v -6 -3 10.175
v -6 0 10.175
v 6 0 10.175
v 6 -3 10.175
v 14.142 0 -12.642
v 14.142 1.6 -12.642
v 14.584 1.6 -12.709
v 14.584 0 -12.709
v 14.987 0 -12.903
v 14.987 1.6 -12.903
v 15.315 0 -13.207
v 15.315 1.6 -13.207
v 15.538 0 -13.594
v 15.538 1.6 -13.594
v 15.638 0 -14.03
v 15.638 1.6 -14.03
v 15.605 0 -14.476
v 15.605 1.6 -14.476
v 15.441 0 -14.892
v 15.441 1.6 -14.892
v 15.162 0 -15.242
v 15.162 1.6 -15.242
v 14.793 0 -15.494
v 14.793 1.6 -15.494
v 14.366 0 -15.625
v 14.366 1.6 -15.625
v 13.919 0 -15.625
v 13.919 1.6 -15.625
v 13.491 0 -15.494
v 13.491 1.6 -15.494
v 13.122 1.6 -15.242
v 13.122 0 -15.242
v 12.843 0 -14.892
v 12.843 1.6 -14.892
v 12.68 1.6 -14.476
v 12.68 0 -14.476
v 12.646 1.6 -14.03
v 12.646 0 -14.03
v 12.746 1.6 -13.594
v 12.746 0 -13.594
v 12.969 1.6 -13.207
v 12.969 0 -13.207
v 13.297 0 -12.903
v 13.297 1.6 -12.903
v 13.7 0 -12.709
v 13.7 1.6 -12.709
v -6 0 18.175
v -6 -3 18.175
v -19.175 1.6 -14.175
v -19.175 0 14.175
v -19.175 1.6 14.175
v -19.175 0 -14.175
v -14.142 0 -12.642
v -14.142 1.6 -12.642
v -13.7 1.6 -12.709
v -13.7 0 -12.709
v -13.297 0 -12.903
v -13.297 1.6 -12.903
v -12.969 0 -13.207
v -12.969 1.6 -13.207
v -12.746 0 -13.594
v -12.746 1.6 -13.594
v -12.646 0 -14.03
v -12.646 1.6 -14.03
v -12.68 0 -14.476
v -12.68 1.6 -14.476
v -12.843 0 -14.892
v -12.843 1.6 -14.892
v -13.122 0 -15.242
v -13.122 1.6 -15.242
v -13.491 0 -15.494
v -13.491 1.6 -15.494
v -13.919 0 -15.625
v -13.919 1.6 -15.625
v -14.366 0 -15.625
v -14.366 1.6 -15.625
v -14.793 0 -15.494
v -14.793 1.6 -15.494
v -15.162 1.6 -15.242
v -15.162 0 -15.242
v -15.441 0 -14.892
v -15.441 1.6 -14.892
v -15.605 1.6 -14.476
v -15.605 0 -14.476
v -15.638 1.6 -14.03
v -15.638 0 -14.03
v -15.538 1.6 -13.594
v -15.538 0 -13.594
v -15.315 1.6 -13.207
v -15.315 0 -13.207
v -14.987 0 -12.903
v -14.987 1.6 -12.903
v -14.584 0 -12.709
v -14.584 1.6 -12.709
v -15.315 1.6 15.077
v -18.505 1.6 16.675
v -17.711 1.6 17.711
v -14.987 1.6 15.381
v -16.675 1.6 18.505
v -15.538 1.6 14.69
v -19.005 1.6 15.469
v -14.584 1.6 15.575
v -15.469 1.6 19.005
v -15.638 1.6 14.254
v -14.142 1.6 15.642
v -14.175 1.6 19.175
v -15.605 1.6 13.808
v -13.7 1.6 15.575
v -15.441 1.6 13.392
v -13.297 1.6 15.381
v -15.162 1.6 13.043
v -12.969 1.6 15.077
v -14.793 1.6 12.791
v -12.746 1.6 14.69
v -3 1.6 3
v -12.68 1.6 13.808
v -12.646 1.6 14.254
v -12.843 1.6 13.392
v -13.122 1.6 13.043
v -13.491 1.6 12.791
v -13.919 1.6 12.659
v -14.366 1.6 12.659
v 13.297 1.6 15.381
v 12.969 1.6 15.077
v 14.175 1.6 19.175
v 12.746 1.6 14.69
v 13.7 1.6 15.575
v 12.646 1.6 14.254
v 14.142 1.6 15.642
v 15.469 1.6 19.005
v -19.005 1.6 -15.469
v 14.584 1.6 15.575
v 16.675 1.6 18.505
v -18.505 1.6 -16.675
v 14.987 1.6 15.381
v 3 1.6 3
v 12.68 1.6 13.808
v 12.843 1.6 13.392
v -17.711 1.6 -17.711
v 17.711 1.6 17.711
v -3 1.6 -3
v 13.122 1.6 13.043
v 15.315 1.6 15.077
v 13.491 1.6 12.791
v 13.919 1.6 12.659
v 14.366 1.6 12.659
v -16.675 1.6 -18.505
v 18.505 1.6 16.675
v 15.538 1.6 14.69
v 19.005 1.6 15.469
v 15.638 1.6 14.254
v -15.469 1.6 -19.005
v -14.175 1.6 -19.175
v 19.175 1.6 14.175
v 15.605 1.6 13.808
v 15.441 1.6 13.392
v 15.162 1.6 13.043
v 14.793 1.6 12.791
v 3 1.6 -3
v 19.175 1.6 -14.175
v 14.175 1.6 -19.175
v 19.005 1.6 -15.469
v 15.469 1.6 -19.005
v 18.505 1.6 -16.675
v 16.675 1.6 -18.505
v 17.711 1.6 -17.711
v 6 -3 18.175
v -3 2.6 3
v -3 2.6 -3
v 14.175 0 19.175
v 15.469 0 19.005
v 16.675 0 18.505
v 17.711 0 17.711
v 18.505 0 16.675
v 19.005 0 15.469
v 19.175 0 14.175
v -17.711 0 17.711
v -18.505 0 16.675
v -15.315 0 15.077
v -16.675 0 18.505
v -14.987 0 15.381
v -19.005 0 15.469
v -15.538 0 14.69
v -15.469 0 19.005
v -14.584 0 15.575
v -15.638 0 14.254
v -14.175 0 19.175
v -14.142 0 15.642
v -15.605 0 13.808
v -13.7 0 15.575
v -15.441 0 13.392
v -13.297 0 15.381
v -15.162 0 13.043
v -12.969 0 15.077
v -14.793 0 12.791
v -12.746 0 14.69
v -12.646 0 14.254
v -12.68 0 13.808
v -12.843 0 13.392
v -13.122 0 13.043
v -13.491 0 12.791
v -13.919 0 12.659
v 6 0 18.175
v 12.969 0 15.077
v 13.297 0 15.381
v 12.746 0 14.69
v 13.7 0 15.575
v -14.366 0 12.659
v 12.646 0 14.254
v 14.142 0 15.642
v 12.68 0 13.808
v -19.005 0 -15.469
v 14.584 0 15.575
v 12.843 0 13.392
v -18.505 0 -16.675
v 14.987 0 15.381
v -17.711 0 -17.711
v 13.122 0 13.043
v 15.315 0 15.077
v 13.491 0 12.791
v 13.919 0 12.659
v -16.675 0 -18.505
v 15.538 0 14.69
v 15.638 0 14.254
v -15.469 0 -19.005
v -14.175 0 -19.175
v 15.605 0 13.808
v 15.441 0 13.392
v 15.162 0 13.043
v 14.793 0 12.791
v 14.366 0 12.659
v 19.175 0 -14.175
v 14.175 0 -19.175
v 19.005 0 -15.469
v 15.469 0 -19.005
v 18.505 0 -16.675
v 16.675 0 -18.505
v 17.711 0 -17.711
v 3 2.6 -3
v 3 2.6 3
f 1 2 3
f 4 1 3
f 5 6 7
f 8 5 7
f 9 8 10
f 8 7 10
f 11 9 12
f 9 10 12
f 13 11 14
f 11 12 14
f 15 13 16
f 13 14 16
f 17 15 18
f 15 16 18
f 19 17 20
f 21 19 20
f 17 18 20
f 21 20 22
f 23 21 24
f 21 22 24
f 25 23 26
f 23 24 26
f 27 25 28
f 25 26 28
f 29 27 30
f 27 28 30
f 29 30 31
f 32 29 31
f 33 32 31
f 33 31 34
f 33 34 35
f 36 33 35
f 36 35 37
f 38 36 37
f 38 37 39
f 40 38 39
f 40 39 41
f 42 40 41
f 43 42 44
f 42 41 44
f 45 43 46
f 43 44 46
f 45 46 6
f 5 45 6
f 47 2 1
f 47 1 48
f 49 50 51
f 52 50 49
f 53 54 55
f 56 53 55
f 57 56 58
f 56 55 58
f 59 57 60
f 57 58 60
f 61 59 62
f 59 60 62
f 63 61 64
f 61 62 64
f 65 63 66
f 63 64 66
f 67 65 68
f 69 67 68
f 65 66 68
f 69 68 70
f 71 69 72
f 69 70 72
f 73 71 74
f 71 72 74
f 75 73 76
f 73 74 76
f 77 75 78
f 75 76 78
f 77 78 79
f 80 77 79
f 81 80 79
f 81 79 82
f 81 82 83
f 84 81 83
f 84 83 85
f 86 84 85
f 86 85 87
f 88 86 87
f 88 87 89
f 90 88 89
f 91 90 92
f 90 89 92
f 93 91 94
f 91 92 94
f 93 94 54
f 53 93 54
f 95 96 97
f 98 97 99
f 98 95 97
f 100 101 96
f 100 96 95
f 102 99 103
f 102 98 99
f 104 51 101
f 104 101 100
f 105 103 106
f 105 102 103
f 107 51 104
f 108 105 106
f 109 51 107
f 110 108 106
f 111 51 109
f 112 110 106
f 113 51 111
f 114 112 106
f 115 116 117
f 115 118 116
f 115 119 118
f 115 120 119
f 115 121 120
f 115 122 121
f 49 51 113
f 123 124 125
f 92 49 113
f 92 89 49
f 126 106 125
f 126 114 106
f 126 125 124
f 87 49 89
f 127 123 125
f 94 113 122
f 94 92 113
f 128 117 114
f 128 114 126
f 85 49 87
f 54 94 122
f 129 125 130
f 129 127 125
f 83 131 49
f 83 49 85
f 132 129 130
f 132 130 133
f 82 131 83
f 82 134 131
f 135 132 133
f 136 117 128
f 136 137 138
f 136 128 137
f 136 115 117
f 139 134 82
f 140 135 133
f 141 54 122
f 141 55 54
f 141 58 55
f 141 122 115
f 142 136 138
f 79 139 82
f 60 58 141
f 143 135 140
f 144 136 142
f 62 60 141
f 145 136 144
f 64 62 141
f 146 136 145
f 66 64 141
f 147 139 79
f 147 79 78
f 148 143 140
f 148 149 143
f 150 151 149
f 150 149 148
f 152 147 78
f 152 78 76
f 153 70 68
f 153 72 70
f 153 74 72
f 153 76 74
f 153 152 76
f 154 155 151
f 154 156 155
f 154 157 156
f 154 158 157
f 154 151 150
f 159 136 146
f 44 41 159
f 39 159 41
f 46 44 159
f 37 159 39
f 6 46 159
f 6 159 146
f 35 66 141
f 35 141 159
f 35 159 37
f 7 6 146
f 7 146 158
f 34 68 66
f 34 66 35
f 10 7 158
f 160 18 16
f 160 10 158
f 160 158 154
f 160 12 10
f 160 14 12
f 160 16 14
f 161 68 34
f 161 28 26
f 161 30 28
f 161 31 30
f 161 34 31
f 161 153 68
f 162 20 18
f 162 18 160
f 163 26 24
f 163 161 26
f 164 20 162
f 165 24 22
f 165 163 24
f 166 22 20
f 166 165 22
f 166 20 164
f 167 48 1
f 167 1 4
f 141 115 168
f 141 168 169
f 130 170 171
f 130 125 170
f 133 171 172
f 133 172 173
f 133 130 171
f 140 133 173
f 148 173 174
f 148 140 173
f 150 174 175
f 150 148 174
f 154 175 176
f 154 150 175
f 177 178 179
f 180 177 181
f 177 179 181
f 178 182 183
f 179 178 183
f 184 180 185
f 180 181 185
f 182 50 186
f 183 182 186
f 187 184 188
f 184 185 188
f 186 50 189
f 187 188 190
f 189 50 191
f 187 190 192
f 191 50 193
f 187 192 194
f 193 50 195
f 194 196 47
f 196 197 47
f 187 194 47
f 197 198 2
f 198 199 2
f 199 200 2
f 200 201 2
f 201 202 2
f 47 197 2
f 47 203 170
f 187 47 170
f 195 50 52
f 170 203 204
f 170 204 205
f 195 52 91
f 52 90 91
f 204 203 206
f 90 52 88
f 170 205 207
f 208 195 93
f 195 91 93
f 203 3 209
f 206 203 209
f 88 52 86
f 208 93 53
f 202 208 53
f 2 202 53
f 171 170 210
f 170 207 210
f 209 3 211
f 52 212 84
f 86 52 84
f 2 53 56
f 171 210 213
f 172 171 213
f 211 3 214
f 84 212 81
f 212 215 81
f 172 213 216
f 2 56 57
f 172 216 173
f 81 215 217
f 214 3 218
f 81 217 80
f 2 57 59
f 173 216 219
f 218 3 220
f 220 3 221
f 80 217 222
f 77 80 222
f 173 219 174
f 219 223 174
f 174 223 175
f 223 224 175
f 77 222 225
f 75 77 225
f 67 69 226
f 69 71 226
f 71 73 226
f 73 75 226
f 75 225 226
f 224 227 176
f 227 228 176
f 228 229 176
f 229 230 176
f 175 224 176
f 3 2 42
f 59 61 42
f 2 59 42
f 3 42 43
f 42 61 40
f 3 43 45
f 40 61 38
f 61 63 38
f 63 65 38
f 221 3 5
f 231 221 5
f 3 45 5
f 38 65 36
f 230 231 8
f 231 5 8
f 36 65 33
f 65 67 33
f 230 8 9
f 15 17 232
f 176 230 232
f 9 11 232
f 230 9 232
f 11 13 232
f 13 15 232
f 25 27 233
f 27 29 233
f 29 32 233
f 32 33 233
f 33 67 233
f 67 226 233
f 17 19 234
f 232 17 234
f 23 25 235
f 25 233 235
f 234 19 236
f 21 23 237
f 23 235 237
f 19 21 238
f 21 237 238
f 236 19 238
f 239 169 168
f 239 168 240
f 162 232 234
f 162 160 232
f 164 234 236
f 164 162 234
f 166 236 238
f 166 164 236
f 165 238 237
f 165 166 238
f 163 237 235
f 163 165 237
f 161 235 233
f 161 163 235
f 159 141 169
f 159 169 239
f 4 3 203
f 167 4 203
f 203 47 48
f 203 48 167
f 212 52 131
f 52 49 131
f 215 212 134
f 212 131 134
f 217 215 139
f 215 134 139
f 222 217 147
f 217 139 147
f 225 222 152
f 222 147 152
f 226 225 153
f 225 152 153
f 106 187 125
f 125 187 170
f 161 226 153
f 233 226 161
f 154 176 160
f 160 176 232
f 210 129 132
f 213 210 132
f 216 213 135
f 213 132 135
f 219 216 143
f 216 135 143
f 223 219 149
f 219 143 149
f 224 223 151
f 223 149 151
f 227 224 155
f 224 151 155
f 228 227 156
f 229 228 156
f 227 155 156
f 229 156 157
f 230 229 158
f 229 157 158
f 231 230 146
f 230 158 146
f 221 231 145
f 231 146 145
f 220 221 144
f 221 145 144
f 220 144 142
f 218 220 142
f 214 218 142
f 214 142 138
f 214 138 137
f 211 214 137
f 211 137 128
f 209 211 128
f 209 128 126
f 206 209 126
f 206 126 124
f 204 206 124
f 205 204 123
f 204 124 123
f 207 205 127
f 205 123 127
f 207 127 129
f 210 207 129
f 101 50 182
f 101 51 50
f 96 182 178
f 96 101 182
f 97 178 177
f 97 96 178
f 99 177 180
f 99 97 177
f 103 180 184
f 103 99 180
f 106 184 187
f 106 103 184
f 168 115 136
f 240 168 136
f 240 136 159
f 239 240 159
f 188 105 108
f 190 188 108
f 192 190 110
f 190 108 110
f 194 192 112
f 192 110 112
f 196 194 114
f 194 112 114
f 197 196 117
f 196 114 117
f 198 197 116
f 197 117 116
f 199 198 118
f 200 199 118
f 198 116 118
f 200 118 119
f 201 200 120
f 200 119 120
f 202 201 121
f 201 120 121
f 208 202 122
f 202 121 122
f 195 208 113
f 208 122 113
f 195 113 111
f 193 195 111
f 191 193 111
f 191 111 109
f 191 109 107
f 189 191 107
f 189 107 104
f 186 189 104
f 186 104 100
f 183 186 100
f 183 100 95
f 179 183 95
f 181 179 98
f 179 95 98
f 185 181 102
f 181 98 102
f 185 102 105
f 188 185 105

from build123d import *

# Parameters (mm, degrees)
SKETCH1_W           = 38.35
SKETCH1_H           = 38.35
BOSS_EXTRUDE1_DEPTH = 1.6
FILLET1_R           = 5
SKETCH2_R           = 1.5
CUT_EXTRUDE1_DEPTH  = 1.6
SKETCH3_W           = 6
SKETCH3_H           = 6
BOSS_EXTRUDE2_DEPTH = 1
SKETCH4_W           = 12
SKETCH4_H           = 8
BOSS_EXTRUDE3_DEPTH = 3


with BuildPart() as part:
    # Sketch1 → Boss-Extrude1 (new body)
    with BuildSketch(Plane(origin=(0, 0, 0), x_dir=(1, 0, 0), z_dir=(0, 1, 0))):
        Rectangle(SKETCH1_W, SKETCH1_H)
    extrude(amount=BOSS_EXTRUDE1_DEPTH)

    # Fillet1
    fillet1_edges = [part.edges().sort_by_distance(p)[0] for p in [
        (19.175, 0.8, 19.175),
        (-19.175, 0.8, 19.175),
        (-19.175, 0.8, -19.175),
        (19.175, 0.8, -19.175),
    ]]
    fillet(fillet1_edges, radius=FILLET1_R)

    # Sketch2 → Cut-Extrude1 (cut)
    with BuildSketch(Plane(origin=(0, 1.6, 0), x_dir=(1, 0, 0), z_dir=(0, 1, 0))):
        with Locations(Location((-14.142135624, 14.142135624, 0), (0, 0, 270))):
            Circle(SKETCH2_R)
        with Locations(Location((14.142135624, 14.142135624, 0), (0, 0, 270))):
            Circle(SKETCH2_R)
        with Locations(Location((-14.142135624, -14.142135624, 0), (0, 0, 270))):
            Circle(SKETCH2_R)
        with Locations(Location((14.142135624, -14.142135624, 0), (0, 0, 270))):
            Circle(SKETCH2_R)
    extrude(amount=-CUT_EXTRUDE1_DEPTH, mode=Mode.SUBTRACT)

    # Sketch3 → Boss-Extrude2 (add)
    with BuildSketch(Plane(origin=(0, 1.6, 0), x_dir=(1, 0, 0), z_dir=(0, 1, 0))):
        Rectangle(SKETCH3_W, SKETCH3_H)
    extrude(amount=BOSS_EXTRUDE2_DEPTH)

    # Sketch4 → Boss-Extrude3 (add)
    with BuildSketch(Plane.XZ):
        with Locations((0, 14.175)):
            Rectangle(SKETCH4_W, SKETCH4_H)
    extrude(amount=BOSS_EXTRUDE3_DEPTH)


solid = part.part
